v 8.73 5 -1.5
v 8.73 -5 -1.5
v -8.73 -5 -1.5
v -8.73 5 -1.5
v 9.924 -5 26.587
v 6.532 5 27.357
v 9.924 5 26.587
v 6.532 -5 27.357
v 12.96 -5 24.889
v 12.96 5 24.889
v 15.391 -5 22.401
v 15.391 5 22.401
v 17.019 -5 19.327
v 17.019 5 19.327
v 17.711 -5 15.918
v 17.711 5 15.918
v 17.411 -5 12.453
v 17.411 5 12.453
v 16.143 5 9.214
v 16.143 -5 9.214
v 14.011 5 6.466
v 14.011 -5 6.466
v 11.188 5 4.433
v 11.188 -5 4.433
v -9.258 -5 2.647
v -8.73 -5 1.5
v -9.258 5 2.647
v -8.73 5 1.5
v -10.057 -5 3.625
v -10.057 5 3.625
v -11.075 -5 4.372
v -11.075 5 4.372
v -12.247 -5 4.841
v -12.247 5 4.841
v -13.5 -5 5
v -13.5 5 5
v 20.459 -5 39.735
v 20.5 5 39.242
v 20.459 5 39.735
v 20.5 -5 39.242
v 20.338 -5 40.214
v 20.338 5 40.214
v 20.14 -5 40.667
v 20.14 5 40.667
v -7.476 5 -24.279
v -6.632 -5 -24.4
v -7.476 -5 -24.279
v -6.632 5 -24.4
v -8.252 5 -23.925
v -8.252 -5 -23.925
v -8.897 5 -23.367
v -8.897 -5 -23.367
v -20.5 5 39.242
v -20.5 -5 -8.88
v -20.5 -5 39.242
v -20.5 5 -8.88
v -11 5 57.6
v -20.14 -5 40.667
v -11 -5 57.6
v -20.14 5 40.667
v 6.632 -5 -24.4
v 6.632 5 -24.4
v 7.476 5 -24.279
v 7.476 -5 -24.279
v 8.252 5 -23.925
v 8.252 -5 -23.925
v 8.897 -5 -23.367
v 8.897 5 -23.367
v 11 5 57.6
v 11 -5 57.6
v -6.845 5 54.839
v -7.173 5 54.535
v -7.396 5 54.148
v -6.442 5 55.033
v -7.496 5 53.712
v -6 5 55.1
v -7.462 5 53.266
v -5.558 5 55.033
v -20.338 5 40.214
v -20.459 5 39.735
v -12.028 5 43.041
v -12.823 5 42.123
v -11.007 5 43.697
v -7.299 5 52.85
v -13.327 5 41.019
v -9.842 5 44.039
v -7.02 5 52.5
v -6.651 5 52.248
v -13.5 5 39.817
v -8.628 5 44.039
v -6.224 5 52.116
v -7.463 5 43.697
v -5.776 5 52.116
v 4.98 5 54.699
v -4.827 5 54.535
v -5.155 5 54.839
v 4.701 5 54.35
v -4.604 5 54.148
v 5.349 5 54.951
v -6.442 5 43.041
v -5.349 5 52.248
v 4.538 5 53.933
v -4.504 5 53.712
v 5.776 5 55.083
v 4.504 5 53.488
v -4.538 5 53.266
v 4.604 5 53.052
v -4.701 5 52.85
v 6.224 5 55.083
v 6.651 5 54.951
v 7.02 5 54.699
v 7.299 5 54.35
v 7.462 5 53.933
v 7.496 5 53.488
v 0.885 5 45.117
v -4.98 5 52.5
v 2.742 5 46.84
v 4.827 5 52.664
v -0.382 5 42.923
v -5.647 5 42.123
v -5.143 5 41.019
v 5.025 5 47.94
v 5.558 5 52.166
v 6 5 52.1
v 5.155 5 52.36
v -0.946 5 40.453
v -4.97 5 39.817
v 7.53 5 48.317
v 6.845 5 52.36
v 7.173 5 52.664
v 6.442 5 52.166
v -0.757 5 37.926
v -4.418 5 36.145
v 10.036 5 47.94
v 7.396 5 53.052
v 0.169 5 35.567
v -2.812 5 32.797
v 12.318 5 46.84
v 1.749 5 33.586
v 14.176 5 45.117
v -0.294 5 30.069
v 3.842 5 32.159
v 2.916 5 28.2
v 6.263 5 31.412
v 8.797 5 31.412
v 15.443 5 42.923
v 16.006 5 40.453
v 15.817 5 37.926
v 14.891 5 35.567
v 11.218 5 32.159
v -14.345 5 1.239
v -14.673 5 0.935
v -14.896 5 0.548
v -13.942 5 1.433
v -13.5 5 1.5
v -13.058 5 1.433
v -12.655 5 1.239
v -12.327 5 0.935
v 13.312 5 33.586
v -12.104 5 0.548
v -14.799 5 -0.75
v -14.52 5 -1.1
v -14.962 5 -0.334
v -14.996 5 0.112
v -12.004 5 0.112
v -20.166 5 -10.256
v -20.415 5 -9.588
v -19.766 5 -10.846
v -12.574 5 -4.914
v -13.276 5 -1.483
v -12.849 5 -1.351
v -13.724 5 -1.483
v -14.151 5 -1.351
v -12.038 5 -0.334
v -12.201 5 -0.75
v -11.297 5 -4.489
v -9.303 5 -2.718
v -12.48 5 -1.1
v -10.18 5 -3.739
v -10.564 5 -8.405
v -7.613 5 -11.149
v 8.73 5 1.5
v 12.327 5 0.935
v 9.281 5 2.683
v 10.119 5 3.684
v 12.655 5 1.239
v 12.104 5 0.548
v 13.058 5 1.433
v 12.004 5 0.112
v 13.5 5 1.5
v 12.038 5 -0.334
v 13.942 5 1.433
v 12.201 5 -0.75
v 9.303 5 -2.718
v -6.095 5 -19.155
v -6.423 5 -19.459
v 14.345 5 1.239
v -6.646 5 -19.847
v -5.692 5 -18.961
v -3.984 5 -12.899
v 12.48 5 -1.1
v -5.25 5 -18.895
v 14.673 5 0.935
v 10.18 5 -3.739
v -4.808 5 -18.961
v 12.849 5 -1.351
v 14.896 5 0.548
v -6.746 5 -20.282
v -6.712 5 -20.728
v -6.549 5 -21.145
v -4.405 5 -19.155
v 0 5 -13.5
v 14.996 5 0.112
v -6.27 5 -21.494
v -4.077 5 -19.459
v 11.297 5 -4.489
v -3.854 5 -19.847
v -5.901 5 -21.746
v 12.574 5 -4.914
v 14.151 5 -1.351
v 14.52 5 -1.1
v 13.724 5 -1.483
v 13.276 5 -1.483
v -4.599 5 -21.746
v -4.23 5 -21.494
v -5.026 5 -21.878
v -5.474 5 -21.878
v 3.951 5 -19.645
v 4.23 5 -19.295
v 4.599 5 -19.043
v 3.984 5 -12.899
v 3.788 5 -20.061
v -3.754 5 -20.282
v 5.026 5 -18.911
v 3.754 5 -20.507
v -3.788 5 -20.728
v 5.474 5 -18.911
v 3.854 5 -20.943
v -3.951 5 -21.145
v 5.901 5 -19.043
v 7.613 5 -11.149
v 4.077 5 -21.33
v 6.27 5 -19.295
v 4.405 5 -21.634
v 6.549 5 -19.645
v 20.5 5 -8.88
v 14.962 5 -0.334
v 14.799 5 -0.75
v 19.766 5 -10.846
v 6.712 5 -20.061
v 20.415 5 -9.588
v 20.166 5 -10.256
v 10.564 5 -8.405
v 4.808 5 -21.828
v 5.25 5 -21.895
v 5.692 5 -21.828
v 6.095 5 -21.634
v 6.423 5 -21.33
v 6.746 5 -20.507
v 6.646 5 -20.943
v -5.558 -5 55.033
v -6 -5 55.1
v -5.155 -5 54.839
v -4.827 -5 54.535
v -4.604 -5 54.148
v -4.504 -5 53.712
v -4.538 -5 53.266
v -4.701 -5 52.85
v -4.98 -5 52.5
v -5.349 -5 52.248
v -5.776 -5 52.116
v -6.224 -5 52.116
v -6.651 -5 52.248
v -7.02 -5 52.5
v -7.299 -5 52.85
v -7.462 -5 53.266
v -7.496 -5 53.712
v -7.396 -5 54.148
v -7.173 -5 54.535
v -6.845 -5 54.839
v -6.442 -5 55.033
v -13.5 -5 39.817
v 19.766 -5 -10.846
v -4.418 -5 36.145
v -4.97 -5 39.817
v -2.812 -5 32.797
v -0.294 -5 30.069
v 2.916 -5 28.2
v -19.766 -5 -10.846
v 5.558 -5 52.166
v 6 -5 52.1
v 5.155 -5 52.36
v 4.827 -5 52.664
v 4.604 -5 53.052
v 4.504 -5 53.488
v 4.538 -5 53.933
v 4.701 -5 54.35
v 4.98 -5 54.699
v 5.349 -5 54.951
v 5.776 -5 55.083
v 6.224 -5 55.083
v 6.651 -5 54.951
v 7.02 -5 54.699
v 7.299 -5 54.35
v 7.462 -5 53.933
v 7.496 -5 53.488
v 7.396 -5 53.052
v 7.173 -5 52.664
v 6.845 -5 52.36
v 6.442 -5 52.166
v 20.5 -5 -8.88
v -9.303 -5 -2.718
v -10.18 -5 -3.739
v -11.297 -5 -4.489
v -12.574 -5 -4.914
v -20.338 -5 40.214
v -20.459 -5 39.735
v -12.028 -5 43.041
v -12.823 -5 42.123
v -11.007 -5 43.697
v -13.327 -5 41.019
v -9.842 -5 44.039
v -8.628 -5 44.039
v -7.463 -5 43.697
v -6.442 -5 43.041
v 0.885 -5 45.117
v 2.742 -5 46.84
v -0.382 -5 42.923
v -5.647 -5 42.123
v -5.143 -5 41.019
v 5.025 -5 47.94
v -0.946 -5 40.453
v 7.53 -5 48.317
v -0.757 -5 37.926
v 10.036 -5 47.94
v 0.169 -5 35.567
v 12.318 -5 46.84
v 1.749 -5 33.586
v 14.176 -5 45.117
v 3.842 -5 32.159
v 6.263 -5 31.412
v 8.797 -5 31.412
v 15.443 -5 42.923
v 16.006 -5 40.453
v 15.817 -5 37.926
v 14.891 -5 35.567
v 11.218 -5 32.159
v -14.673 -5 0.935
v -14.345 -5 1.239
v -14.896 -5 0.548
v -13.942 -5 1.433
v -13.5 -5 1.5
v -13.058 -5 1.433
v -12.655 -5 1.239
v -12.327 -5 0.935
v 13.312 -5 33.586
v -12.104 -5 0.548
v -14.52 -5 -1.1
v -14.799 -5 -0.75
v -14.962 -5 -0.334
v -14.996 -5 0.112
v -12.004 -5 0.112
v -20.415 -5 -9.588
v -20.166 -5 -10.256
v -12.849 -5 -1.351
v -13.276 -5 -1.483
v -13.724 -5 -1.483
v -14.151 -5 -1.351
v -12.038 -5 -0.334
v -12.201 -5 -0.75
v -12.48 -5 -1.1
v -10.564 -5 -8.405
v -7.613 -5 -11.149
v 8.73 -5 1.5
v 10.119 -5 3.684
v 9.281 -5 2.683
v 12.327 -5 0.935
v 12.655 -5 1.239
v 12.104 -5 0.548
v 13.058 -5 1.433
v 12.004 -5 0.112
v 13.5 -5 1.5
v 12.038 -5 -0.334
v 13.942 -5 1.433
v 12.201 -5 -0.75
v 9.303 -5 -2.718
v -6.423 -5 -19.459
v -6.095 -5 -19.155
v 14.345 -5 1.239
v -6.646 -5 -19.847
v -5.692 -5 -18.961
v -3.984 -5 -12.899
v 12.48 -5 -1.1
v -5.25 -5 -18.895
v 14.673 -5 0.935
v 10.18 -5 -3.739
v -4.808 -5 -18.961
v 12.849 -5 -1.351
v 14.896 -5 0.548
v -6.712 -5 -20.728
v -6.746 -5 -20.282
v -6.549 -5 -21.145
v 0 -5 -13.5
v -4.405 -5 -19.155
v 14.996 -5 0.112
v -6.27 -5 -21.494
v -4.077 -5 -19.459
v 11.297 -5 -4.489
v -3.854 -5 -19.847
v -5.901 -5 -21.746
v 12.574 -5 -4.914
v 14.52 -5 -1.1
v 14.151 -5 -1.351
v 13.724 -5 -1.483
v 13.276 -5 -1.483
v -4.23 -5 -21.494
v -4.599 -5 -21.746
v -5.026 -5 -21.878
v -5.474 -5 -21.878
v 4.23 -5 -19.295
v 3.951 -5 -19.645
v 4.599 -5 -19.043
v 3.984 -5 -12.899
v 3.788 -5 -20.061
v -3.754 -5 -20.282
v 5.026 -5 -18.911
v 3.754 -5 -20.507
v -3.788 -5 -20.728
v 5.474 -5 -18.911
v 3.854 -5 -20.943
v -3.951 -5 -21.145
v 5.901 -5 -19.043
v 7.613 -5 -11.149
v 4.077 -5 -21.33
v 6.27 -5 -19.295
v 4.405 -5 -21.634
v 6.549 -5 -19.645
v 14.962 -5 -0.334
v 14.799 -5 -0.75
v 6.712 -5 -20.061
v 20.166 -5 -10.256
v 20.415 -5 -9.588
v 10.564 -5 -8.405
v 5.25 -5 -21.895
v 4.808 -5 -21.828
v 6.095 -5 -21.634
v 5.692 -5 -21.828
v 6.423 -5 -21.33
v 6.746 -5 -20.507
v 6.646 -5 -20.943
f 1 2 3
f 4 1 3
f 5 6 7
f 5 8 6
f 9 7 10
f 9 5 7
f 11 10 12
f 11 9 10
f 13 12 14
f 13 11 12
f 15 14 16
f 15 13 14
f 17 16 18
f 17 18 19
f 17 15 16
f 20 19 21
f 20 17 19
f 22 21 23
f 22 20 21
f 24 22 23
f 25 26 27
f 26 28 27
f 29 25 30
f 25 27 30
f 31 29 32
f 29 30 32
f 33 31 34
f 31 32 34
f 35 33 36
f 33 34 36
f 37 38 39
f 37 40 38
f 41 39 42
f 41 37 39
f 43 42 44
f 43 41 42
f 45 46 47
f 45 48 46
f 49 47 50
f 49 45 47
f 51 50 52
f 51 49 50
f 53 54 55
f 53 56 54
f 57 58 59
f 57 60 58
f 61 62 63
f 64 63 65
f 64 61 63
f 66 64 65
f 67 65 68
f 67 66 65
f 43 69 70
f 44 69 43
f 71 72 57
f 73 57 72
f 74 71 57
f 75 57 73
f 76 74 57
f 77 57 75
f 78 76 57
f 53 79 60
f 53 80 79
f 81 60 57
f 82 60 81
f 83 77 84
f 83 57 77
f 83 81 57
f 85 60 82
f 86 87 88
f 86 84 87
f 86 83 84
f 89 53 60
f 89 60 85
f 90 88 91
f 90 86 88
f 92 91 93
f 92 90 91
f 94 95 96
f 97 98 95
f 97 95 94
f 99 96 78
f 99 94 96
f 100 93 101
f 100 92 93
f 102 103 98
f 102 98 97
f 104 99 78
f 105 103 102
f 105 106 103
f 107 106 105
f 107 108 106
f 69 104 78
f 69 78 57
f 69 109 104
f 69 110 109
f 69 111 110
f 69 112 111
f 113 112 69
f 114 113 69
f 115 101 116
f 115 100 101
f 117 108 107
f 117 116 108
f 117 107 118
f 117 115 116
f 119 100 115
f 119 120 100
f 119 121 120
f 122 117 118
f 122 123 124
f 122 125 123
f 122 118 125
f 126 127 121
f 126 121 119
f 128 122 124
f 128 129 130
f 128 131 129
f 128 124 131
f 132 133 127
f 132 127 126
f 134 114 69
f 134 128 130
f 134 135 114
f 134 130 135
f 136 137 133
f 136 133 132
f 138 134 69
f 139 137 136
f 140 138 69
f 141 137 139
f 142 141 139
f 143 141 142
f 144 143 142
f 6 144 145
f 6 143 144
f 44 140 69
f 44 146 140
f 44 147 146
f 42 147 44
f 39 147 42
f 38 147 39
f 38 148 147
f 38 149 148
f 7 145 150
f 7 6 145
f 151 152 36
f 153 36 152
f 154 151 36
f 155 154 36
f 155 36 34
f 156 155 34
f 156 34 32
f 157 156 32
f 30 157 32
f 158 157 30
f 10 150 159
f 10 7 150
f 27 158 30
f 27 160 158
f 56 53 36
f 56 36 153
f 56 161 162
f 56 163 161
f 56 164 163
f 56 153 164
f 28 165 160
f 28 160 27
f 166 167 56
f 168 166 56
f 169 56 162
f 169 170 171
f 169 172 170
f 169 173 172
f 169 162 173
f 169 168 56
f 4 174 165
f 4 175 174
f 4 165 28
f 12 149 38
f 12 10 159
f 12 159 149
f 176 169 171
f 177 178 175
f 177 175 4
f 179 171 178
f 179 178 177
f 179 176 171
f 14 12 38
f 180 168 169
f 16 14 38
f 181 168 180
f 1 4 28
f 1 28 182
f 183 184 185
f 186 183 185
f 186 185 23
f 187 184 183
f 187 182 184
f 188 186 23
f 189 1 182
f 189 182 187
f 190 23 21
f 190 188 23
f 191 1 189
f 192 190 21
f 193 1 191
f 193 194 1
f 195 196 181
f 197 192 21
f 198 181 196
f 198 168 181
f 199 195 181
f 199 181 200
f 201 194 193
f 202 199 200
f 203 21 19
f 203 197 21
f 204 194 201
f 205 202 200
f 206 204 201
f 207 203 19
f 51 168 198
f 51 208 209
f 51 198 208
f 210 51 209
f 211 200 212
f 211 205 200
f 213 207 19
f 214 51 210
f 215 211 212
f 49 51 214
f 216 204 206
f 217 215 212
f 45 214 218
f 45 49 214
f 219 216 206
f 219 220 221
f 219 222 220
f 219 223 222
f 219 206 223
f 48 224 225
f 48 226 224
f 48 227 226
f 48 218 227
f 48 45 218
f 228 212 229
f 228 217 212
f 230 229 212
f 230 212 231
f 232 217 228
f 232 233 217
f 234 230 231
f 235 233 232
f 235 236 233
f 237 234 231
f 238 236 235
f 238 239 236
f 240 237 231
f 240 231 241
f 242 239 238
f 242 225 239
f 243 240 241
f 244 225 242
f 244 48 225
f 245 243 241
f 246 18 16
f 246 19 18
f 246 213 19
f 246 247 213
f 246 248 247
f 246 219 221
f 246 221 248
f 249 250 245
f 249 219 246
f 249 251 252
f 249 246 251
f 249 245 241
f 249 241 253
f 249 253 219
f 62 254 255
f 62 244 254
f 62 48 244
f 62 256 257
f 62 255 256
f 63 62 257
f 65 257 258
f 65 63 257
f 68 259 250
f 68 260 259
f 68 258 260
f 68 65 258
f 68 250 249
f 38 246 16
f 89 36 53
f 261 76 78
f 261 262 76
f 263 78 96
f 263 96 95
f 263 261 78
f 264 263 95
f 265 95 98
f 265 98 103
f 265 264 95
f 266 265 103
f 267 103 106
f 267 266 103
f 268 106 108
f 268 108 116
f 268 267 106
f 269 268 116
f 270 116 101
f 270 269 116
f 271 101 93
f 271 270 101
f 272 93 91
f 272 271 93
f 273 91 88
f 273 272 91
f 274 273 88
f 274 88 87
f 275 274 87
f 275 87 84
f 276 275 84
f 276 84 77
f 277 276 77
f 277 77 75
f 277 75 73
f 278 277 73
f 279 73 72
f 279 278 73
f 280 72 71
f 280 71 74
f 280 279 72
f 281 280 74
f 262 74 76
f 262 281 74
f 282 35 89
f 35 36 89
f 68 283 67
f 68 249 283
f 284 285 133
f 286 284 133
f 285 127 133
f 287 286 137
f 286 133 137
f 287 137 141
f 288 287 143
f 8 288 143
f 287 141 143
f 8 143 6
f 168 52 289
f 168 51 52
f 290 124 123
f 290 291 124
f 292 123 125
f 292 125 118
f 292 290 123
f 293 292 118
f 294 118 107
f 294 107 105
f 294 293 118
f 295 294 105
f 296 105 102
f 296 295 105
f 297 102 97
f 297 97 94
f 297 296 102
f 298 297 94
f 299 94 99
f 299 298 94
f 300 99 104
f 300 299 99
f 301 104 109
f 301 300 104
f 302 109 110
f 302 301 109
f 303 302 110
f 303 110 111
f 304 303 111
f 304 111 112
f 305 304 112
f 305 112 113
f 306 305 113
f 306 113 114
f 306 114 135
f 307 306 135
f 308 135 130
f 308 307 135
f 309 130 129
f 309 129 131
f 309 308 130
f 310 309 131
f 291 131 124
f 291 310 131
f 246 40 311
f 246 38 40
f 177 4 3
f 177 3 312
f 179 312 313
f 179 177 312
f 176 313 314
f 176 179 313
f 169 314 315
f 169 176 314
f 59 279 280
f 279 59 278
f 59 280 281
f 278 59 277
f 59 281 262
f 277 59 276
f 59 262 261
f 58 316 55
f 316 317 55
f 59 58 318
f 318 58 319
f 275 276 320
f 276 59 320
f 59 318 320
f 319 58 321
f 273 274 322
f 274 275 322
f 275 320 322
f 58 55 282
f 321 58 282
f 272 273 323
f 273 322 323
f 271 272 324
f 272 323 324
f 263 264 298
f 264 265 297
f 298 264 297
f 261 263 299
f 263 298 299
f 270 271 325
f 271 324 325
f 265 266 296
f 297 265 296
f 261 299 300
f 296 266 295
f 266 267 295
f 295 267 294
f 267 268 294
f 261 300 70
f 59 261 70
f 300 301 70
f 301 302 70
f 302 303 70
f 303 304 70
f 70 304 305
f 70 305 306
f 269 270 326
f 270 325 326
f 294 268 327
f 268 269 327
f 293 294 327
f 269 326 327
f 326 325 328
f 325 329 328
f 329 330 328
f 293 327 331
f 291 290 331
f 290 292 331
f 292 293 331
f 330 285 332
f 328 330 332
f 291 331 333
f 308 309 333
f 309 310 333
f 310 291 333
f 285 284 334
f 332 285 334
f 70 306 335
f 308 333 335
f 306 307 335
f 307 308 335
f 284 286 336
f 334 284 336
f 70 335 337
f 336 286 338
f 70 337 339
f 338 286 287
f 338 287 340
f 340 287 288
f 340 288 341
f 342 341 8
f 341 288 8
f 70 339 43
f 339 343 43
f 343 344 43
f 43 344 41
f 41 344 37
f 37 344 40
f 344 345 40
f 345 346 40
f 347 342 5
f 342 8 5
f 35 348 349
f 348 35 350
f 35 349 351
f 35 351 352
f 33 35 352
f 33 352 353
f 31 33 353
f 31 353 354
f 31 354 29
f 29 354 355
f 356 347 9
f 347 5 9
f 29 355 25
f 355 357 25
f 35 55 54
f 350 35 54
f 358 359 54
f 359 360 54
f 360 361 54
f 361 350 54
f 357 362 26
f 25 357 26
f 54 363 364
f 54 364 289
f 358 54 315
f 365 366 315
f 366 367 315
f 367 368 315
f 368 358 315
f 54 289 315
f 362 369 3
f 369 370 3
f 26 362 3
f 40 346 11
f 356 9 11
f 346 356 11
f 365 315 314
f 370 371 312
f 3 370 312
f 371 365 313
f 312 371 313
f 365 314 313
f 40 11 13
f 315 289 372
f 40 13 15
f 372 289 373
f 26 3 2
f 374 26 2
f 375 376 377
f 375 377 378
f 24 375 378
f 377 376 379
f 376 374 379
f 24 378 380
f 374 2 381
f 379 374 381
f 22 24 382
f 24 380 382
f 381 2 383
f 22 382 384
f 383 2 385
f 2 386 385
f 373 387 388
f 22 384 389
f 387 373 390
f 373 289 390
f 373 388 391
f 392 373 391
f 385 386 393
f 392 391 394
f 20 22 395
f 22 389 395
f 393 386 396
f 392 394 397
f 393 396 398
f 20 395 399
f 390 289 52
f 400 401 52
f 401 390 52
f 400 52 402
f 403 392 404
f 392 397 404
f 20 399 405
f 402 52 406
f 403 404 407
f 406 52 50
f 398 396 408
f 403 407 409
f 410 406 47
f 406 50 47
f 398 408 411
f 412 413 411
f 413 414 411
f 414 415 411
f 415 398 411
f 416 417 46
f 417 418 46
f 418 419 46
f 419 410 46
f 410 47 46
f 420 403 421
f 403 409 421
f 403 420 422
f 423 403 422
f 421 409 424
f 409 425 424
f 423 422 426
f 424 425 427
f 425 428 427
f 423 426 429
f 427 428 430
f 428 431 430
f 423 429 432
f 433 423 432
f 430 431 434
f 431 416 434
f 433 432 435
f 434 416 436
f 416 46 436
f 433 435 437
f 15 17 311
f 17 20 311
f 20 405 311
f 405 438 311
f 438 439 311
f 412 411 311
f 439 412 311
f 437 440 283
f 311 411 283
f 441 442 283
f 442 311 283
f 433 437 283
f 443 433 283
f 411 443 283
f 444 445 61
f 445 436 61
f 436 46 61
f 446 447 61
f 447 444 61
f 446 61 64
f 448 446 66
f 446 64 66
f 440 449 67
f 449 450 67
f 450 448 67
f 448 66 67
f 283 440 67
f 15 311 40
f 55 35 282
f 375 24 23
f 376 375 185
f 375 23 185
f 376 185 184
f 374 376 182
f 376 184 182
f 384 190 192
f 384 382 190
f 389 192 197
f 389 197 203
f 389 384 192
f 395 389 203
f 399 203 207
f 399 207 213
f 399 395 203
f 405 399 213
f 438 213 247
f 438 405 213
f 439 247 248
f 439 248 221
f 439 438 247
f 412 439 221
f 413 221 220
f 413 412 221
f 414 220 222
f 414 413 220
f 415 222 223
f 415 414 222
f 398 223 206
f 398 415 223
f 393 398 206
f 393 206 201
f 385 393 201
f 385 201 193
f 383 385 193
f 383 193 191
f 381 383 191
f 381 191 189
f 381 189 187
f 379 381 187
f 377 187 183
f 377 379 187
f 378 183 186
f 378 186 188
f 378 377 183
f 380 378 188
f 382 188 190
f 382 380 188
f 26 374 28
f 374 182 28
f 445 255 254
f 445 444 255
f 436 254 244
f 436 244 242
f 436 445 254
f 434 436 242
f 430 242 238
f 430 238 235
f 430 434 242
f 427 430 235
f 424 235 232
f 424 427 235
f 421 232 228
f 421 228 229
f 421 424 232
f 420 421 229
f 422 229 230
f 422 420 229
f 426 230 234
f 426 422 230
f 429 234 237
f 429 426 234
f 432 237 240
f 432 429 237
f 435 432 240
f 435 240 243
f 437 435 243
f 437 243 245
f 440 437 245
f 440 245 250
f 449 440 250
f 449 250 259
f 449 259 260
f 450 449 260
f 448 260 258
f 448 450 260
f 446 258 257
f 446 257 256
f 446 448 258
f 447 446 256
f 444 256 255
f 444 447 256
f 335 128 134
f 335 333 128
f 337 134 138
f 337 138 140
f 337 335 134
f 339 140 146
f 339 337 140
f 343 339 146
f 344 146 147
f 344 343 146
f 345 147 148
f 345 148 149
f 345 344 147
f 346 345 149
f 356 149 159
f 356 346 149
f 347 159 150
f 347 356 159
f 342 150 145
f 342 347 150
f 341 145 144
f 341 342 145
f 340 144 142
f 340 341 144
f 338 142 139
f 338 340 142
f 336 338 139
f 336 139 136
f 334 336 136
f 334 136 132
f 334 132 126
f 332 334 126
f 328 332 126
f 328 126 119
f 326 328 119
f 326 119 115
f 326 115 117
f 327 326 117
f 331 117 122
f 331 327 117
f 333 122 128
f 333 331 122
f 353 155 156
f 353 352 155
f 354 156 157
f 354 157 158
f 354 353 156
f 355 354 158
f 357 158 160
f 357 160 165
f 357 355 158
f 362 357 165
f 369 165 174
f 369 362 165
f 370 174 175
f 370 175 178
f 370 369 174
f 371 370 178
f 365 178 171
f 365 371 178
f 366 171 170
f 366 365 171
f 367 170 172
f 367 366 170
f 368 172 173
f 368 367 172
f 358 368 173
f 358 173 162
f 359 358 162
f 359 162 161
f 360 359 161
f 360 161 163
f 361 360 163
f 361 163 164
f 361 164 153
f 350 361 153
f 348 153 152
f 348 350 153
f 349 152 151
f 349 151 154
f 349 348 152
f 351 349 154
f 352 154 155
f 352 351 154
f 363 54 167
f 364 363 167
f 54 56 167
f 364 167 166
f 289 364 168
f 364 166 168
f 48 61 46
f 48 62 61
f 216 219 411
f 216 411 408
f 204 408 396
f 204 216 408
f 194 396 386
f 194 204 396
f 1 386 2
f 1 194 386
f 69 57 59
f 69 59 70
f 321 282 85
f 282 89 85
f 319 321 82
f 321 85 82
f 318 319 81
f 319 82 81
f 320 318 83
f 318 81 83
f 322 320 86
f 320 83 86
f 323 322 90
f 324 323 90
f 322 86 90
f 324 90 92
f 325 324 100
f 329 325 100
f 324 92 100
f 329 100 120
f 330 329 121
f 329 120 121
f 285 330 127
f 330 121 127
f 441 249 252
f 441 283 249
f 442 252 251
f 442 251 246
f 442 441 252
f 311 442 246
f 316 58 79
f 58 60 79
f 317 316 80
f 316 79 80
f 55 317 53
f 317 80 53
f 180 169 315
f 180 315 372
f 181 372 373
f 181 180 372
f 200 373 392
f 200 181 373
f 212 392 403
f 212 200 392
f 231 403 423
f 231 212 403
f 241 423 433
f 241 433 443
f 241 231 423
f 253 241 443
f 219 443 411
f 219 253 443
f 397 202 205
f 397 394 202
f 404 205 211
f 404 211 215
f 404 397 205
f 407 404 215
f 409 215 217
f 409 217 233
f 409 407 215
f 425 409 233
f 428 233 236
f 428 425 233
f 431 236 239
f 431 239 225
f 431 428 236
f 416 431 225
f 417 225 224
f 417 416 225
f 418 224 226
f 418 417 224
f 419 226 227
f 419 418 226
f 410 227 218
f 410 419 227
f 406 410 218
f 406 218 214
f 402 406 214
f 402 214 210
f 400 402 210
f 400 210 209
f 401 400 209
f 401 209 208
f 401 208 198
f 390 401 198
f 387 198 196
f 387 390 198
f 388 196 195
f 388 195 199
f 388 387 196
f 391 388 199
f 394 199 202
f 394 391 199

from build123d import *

# Parameters (mm, degrees)
SKETCH1_R           = 1.5
SKETCH1_R_2         = 8.5
BOSS_EXTRUDE1_DEPTH = 5
FILLET1_R           = 3


with BuildPart() as part:
    # Sketch1 → Boss-Extrude1 (new, symmetric)
    with BuildSketch(Plane(origin=(0, 0, 0), x_dir=(1, 0, 0), z_dir=(0, 1, 0))):
        Polygon((8, 24.400284093), (-8, 24.400284093), (-20.5, 10), (-20.5, -40), (-11, -57.599715907), (11, -57.599715907), (20.5, -40), (20.5, 10), align=None)
        with Locations(Location((-5.25, 20.39454584, 0), (0, 0, 270))):
            Circle(SKETCH1_R, mode=Mode.SUBTRACT)
        with Locations(Location((-6, -53.599715907, 0), (0, 0, 270))):
            Circle(SKETCH1_R, mode=Mode.SUBTRACT)
        with Locations(Location((6, -53.599715907, 0), (0, 0, 90))):
            Circle(SKETCH1_R, mode=Mode.SUBTRACT)
        with Locations(Location((5.25, 20.39454584, 0), (0, 0, 90))):
            Circle(SKETCH1_R, mode=Mode.SUBTRACT)
        with Locations(Location((-13.5, 0, 0), (0, 0, 270))):
            Circle(SKETCH1_R, mode=Mode.SUBTRACT)
        with Locations(Location((13.5, 0, 0), (0, 0, 270))):
            Circle(SKETCH1_R, mode=Mode.SUBTRACT)
        with Locations(Location((7.530163354, -39.817414772, 0), (0, 0, 270))):
            Circle(SKETCH1_R_2, mode=Mode.SUBTRACT)
        with BuildLine():
            Line((-13.5, -5), (-13.5, -39.817414772))
            ThreePointArc((-13.5, -39.817414772), (-9.234918323, -44.082496449), (-4.969836646, -39.817414772))
            ThreePointArc((-4.969836646, -39.817414772), (-1.654816501, -31.338845018), (6.531946565, -27.35733599))
            ThreePointArc((6.531946565, -27.35733599), (17.487572325, -17.647670786), (11.187975781, -4.433344563))
            ThreePointArc((11.187975781, -4.433344563), (9.667400631, -3.211102938), (8.730303993, -1.5))
            Line((8.730303993, -1.5), (-8.730303993, -1.5))
            ThreePointArc((-8.730303993, -1.5), (-10.541960108, -4.031128874), (-13.5, -5))
        make_face(mode=Mode.SUBTRACT)
        with BuildLine():
            Line((8.730303993, 1.5), (-8.730303993, 1.5))
            ThreePointArc((-8.730303993, 1.5), (-10.179901517, 3.738575405), (-12.574074074, 4.913518208))
            ThreePointArc((-12.574074074, 4.913518208), (0, 13.5), (12.574074074, 4.913518208))
            ThreePointArc((12.574074074, 4.913518208), (10.179901517, 3.738575405), (8.730303993, 1.5))
        make_face(mode=Mode.SUBTRACT)
    extrude(amount=BOSS_EXTRUDE1_DEPTH, both=True)

    # Fillet1
    fillet1_edges = [part.edges().sort_by_distance(p)[0] for p in [
        (-20.5, 0, 40),
        (-20.5, 0, -10),
        (-8, 0, -24.400284093),
        (8, 0, -24.400284093),
        (20.5, 0, -10),
        (20.5, 0, 40),
    ]]
    fillet(fillet1_edges, radius=FILLET1_R)


solid = part.part
